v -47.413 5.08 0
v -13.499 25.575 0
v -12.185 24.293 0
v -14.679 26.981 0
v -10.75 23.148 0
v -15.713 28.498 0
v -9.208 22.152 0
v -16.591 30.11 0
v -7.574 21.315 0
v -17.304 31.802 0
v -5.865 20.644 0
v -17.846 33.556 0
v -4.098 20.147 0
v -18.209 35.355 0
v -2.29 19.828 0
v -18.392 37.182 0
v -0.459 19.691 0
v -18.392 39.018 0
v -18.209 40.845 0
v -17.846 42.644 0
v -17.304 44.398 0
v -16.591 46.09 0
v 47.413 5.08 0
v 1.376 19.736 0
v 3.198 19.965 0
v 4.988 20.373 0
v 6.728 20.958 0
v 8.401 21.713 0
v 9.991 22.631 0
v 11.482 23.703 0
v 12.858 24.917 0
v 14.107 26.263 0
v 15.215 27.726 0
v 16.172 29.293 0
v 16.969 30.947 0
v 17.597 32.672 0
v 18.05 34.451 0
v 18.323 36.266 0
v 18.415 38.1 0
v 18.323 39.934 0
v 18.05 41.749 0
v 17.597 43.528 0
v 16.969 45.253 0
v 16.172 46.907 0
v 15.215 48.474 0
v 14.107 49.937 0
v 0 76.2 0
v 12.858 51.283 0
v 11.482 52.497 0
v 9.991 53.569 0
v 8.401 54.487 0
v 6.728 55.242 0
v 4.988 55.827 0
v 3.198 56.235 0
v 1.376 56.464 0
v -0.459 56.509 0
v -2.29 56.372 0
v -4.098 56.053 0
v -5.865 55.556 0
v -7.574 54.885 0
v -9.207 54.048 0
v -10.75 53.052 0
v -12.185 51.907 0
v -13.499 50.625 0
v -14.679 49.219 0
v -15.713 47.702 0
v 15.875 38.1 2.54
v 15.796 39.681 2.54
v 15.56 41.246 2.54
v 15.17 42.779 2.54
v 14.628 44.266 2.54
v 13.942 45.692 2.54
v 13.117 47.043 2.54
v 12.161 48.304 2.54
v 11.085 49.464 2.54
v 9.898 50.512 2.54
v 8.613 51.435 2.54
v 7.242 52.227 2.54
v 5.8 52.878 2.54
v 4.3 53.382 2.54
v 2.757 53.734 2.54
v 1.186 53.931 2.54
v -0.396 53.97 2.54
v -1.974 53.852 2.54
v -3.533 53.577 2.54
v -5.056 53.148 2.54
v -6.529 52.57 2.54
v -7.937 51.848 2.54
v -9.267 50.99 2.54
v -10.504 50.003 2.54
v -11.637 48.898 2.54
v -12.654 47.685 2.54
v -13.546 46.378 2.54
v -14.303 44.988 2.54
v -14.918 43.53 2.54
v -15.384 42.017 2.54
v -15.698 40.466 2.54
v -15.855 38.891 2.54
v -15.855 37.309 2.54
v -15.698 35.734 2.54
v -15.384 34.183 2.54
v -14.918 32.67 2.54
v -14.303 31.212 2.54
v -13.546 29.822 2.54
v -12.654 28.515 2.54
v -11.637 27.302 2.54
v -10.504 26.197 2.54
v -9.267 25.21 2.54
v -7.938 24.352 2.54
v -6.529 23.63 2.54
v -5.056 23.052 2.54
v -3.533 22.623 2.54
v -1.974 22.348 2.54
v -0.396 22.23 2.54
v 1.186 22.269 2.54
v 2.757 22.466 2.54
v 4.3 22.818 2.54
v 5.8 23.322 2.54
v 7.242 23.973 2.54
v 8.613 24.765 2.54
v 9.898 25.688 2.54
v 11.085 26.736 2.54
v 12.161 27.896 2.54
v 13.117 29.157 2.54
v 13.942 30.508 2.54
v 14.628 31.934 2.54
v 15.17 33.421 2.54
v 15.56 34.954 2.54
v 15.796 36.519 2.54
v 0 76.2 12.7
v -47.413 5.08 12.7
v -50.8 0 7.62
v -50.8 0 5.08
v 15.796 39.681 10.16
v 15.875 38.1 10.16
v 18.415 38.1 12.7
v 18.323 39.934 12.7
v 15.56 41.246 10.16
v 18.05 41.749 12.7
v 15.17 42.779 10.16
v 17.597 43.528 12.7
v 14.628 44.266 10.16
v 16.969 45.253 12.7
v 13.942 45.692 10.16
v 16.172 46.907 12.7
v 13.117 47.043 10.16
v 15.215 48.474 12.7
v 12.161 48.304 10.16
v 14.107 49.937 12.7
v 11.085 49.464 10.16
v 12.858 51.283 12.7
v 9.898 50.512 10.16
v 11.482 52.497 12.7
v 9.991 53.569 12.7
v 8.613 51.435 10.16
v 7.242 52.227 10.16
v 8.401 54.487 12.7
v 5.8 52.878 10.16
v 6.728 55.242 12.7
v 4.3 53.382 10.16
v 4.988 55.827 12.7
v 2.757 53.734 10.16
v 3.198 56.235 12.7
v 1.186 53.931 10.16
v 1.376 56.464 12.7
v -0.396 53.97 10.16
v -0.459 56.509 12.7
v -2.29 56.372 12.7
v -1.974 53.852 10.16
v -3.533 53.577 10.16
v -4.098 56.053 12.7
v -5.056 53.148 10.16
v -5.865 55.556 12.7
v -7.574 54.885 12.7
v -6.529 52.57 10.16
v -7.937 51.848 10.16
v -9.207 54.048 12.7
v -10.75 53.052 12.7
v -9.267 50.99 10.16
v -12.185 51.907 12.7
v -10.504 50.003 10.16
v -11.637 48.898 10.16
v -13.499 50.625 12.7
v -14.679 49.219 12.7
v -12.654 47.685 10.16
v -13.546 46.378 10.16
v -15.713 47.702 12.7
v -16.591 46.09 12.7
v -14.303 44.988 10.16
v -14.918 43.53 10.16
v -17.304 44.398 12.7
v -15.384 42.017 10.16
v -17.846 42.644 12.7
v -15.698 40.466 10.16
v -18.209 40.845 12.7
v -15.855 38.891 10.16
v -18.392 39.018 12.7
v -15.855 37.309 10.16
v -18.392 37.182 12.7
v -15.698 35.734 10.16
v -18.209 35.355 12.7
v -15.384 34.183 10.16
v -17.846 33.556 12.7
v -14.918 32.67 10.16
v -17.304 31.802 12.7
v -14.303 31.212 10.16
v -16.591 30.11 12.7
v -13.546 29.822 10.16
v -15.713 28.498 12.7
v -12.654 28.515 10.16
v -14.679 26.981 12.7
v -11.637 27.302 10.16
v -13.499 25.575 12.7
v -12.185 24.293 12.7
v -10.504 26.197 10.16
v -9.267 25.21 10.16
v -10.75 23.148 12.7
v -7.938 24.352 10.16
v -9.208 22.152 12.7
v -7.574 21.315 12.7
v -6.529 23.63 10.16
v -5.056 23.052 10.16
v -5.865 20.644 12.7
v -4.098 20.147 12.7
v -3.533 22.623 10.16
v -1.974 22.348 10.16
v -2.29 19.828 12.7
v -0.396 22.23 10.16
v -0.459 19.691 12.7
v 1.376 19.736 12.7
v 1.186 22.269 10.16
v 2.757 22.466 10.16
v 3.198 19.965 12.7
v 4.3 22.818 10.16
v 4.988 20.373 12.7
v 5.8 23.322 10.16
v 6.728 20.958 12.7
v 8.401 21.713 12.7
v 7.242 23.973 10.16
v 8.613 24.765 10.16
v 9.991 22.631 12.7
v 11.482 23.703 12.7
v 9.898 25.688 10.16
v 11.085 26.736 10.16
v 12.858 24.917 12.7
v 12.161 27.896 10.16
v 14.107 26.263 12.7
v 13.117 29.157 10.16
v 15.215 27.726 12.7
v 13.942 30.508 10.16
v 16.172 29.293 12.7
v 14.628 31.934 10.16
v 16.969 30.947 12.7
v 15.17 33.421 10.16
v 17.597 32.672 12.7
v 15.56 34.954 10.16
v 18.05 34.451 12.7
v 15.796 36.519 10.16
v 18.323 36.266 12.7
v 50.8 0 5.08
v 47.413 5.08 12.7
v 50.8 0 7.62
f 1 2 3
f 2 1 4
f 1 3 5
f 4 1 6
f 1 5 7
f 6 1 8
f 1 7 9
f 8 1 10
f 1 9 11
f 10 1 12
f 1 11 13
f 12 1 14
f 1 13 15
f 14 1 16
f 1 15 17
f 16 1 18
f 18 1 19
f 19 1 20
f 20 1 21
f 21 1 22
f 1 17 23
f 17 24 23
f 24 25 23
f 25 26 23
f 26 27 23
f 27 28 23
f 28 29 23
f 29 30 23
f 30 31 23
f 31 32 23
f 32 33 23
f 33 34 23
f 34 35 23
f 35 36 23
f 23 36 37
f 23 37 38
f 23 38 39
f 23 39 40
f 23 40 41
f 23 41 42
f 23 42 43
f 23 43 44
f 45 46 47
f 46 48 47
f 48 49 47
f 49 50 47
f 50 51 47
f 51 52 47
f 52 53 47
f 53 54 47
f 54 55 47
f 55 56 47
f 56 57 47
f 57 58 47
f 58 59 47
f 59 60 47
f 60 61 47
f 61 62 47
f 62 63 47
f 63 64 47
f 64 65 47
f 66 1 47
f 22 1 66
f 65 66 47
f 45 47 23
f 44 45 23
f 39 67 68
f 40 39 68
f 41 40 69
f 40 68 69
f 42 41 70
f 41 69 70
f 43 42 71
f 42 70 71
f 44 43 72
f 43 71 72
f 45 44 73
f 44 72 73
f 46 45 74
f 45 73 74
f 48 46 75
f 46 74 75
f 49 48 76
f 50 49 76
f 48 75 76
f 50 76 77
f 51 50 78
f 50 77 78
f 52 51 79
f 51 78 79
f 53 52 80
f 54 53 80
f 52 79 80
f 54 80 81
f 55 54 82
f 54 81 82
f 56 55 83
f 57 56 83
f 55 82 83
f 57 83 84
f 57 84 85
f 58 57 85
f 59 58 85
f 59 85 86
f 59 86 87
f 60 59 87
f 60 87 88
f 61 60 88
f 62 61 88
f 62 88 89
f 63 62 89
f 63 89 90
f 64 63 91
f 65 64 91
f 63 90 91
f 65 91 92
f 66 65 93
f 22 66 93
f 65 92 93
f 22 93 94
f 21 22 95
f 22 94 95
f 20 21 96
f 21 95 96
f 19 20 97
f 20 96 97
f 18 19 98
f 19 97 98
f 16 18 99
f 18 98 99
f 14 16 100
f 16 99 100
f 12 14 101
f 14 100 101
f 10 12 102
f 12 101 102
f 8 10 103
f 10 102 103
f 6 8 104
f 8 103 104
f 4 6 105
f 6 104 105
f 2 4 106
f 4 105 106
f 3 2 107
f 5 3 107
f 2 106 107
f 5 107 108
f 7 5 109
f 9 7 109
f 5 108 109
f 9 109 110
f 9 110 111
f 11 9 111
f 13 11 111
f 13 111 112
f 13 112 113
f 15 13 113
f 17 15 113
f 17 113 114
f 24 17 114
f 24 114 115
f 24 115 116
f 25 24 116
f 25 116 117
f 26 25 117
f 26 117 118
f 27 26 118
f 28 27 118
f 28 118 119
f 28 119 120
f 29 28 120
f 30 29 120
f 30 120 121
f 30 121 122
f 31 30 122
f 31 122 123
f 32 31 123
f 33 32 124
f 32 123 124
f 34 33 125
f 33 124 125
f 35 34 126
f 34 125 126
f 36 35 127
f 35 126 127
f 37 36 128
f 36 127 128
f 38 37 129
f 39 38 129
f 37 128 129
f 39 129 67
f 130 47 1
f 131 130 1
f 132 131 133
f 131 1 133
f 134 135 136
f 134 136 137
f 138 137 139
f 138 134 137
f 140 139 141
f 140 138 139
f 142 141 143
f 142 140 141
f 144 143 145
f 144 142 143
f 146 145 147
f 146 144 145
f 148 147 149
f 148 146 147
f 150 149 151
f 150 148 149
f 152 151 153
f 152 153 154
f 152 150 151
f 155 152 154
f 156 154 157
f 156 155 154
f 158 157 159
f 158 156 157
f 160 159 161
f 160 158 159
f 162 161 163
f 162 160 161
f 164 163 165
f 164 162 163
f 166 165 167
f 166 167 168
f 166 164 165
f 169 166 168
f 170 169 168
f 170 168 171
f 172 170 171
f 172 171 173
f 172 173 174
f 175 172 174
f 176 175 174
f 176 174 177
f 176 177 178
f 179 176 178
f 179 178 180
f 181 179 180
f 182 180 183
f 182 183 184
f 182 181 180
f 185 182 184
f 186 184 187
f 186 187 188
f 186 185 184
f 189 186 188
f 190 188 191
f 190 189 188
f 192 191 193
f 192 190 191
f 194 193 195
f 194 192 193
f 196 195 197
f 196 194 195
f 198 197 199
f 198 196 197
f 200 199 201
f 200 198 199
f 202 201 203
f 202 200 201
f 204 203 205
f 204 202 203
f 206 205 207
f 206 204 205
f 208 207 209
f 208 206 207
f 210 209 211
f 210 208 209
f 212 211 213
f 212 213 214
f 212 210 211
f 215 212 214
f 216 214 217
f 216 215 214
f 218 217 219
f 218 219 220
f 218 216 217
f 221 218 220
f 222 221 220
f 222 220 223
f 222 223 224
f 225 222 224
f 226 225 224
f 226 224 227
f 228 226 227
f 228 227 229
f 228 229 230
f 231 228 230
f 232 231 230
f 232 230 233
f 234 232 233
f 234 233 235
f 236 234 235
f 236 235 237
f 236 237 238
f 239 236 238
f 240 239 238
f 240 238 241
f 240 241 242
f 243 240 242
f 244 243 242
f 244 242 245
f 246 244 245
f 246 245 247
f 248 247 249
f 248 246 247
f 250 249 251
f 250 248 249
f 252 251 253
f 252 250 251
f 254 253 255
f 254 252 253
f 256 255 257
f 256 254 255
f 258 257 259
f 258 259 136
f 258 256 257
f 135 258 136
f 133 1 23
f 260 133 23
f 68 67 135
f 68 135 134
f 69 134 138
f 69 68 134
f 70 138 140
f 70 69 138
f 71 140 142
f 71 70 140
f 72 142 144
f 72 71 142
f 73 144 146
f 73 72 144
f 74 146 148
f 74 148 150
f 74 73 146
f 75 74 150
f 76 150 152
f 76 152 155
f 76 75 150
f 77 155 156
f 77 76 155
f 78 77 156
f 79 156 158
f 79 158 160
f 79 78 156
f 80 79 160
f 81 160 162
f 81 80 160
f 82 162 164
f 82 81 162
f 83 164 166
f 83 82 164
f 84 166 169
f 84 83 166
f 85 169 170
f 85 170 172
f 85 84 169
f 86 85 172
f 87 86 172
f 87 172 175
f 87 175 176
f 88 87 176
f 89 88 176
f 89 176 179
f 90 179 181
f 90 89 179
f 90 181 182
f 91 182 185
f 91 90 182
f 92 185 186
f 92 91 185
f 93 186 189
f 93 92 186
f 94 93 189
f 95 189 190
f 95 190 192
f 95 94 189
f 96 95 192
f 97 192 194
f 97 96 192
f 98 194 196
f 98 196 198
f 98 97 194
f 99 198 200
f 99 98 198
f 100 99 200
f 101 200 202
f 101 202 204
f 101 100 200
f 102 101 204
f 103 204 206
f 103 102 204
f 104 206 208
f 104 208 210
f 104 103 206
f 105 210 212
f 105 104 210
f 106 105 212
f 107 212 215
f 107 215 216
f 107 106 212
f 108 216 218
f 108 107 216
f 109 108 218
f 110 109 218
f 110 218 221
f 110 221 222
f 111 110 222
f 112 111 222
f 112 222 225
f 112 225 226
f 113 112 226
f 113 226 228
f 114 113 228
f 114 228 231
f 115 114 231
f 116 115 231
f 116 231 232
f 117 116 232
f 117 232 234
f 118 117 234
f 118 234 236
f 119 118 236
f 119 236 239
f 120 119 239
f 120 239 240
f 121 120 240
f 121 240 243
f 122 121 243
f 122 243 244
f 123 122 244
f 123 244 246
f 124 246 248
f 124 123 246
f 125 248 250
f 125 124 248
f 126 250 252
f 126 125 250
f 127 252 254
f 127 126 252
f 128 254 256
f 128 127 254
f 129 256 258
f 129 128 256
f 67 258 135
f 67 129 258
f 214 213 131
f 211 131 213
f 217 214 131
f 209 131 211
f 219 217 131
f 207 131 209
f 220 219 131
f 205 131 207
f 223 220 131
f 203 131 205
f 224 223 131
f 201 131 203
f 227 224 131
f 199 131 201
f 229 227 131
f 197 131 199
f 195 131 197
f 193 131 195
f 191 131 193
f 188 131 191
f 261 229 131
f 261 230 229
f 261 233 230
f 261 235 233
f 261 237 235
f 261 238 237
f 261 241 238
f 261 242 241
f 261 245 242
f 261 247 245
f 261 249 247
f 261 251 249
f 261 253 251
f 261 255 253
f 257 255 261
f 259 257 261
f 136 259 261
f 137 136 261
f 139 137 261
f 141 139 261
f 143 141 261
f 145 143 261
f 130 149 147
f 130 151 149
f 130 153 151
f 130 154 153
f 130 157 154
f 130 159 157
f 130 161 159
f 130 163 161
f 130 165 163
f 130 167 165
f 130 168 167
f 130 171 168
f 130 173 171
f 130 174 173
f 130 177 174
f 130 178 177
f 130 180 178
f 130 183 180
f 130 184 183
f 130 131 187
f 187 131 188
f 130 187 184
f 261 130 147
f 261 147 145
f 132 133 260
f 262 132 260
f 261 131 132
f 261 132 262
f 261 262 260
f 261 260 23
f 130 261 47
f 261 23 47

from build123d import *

# Parameters (mm, degrees)
F0_R     = 15.875
F1_DEPTH = 12.7
F2_SIZE  = 5.08
F3_SIZE  = 2.54


with BuildPart() as f1:
    # F0 (on Top) → F1 (new body)
    with BuildSketch(Plane.XY):
        Polygon((0, 76.2), (-50.8, 0), (50.8, 0), align=None)
        with Locations((0, 38.1)):
            Circle(F0_R, mode=Mode.SUBTRACT)
    extrude(amount=F1_DEPTH)

    # F2
    f2_edges = [f1.edges().sort_by_distance(p)[0] for p in [
        (0, 0, 12.7),
        (0, 0, 0),
    ]]
    chamfer(f2_edges, length=F2_SIZE)

    # F3
    f3_edges = [f1.edges().sort_by_distance(p)[0] for p in [
        (-15.875, 38.1, 0),
        (-15.875, 38.1, 12.7),
    ]]
    chamfer(f3_edges, length=F3_SIZE)


solid = f1.part
